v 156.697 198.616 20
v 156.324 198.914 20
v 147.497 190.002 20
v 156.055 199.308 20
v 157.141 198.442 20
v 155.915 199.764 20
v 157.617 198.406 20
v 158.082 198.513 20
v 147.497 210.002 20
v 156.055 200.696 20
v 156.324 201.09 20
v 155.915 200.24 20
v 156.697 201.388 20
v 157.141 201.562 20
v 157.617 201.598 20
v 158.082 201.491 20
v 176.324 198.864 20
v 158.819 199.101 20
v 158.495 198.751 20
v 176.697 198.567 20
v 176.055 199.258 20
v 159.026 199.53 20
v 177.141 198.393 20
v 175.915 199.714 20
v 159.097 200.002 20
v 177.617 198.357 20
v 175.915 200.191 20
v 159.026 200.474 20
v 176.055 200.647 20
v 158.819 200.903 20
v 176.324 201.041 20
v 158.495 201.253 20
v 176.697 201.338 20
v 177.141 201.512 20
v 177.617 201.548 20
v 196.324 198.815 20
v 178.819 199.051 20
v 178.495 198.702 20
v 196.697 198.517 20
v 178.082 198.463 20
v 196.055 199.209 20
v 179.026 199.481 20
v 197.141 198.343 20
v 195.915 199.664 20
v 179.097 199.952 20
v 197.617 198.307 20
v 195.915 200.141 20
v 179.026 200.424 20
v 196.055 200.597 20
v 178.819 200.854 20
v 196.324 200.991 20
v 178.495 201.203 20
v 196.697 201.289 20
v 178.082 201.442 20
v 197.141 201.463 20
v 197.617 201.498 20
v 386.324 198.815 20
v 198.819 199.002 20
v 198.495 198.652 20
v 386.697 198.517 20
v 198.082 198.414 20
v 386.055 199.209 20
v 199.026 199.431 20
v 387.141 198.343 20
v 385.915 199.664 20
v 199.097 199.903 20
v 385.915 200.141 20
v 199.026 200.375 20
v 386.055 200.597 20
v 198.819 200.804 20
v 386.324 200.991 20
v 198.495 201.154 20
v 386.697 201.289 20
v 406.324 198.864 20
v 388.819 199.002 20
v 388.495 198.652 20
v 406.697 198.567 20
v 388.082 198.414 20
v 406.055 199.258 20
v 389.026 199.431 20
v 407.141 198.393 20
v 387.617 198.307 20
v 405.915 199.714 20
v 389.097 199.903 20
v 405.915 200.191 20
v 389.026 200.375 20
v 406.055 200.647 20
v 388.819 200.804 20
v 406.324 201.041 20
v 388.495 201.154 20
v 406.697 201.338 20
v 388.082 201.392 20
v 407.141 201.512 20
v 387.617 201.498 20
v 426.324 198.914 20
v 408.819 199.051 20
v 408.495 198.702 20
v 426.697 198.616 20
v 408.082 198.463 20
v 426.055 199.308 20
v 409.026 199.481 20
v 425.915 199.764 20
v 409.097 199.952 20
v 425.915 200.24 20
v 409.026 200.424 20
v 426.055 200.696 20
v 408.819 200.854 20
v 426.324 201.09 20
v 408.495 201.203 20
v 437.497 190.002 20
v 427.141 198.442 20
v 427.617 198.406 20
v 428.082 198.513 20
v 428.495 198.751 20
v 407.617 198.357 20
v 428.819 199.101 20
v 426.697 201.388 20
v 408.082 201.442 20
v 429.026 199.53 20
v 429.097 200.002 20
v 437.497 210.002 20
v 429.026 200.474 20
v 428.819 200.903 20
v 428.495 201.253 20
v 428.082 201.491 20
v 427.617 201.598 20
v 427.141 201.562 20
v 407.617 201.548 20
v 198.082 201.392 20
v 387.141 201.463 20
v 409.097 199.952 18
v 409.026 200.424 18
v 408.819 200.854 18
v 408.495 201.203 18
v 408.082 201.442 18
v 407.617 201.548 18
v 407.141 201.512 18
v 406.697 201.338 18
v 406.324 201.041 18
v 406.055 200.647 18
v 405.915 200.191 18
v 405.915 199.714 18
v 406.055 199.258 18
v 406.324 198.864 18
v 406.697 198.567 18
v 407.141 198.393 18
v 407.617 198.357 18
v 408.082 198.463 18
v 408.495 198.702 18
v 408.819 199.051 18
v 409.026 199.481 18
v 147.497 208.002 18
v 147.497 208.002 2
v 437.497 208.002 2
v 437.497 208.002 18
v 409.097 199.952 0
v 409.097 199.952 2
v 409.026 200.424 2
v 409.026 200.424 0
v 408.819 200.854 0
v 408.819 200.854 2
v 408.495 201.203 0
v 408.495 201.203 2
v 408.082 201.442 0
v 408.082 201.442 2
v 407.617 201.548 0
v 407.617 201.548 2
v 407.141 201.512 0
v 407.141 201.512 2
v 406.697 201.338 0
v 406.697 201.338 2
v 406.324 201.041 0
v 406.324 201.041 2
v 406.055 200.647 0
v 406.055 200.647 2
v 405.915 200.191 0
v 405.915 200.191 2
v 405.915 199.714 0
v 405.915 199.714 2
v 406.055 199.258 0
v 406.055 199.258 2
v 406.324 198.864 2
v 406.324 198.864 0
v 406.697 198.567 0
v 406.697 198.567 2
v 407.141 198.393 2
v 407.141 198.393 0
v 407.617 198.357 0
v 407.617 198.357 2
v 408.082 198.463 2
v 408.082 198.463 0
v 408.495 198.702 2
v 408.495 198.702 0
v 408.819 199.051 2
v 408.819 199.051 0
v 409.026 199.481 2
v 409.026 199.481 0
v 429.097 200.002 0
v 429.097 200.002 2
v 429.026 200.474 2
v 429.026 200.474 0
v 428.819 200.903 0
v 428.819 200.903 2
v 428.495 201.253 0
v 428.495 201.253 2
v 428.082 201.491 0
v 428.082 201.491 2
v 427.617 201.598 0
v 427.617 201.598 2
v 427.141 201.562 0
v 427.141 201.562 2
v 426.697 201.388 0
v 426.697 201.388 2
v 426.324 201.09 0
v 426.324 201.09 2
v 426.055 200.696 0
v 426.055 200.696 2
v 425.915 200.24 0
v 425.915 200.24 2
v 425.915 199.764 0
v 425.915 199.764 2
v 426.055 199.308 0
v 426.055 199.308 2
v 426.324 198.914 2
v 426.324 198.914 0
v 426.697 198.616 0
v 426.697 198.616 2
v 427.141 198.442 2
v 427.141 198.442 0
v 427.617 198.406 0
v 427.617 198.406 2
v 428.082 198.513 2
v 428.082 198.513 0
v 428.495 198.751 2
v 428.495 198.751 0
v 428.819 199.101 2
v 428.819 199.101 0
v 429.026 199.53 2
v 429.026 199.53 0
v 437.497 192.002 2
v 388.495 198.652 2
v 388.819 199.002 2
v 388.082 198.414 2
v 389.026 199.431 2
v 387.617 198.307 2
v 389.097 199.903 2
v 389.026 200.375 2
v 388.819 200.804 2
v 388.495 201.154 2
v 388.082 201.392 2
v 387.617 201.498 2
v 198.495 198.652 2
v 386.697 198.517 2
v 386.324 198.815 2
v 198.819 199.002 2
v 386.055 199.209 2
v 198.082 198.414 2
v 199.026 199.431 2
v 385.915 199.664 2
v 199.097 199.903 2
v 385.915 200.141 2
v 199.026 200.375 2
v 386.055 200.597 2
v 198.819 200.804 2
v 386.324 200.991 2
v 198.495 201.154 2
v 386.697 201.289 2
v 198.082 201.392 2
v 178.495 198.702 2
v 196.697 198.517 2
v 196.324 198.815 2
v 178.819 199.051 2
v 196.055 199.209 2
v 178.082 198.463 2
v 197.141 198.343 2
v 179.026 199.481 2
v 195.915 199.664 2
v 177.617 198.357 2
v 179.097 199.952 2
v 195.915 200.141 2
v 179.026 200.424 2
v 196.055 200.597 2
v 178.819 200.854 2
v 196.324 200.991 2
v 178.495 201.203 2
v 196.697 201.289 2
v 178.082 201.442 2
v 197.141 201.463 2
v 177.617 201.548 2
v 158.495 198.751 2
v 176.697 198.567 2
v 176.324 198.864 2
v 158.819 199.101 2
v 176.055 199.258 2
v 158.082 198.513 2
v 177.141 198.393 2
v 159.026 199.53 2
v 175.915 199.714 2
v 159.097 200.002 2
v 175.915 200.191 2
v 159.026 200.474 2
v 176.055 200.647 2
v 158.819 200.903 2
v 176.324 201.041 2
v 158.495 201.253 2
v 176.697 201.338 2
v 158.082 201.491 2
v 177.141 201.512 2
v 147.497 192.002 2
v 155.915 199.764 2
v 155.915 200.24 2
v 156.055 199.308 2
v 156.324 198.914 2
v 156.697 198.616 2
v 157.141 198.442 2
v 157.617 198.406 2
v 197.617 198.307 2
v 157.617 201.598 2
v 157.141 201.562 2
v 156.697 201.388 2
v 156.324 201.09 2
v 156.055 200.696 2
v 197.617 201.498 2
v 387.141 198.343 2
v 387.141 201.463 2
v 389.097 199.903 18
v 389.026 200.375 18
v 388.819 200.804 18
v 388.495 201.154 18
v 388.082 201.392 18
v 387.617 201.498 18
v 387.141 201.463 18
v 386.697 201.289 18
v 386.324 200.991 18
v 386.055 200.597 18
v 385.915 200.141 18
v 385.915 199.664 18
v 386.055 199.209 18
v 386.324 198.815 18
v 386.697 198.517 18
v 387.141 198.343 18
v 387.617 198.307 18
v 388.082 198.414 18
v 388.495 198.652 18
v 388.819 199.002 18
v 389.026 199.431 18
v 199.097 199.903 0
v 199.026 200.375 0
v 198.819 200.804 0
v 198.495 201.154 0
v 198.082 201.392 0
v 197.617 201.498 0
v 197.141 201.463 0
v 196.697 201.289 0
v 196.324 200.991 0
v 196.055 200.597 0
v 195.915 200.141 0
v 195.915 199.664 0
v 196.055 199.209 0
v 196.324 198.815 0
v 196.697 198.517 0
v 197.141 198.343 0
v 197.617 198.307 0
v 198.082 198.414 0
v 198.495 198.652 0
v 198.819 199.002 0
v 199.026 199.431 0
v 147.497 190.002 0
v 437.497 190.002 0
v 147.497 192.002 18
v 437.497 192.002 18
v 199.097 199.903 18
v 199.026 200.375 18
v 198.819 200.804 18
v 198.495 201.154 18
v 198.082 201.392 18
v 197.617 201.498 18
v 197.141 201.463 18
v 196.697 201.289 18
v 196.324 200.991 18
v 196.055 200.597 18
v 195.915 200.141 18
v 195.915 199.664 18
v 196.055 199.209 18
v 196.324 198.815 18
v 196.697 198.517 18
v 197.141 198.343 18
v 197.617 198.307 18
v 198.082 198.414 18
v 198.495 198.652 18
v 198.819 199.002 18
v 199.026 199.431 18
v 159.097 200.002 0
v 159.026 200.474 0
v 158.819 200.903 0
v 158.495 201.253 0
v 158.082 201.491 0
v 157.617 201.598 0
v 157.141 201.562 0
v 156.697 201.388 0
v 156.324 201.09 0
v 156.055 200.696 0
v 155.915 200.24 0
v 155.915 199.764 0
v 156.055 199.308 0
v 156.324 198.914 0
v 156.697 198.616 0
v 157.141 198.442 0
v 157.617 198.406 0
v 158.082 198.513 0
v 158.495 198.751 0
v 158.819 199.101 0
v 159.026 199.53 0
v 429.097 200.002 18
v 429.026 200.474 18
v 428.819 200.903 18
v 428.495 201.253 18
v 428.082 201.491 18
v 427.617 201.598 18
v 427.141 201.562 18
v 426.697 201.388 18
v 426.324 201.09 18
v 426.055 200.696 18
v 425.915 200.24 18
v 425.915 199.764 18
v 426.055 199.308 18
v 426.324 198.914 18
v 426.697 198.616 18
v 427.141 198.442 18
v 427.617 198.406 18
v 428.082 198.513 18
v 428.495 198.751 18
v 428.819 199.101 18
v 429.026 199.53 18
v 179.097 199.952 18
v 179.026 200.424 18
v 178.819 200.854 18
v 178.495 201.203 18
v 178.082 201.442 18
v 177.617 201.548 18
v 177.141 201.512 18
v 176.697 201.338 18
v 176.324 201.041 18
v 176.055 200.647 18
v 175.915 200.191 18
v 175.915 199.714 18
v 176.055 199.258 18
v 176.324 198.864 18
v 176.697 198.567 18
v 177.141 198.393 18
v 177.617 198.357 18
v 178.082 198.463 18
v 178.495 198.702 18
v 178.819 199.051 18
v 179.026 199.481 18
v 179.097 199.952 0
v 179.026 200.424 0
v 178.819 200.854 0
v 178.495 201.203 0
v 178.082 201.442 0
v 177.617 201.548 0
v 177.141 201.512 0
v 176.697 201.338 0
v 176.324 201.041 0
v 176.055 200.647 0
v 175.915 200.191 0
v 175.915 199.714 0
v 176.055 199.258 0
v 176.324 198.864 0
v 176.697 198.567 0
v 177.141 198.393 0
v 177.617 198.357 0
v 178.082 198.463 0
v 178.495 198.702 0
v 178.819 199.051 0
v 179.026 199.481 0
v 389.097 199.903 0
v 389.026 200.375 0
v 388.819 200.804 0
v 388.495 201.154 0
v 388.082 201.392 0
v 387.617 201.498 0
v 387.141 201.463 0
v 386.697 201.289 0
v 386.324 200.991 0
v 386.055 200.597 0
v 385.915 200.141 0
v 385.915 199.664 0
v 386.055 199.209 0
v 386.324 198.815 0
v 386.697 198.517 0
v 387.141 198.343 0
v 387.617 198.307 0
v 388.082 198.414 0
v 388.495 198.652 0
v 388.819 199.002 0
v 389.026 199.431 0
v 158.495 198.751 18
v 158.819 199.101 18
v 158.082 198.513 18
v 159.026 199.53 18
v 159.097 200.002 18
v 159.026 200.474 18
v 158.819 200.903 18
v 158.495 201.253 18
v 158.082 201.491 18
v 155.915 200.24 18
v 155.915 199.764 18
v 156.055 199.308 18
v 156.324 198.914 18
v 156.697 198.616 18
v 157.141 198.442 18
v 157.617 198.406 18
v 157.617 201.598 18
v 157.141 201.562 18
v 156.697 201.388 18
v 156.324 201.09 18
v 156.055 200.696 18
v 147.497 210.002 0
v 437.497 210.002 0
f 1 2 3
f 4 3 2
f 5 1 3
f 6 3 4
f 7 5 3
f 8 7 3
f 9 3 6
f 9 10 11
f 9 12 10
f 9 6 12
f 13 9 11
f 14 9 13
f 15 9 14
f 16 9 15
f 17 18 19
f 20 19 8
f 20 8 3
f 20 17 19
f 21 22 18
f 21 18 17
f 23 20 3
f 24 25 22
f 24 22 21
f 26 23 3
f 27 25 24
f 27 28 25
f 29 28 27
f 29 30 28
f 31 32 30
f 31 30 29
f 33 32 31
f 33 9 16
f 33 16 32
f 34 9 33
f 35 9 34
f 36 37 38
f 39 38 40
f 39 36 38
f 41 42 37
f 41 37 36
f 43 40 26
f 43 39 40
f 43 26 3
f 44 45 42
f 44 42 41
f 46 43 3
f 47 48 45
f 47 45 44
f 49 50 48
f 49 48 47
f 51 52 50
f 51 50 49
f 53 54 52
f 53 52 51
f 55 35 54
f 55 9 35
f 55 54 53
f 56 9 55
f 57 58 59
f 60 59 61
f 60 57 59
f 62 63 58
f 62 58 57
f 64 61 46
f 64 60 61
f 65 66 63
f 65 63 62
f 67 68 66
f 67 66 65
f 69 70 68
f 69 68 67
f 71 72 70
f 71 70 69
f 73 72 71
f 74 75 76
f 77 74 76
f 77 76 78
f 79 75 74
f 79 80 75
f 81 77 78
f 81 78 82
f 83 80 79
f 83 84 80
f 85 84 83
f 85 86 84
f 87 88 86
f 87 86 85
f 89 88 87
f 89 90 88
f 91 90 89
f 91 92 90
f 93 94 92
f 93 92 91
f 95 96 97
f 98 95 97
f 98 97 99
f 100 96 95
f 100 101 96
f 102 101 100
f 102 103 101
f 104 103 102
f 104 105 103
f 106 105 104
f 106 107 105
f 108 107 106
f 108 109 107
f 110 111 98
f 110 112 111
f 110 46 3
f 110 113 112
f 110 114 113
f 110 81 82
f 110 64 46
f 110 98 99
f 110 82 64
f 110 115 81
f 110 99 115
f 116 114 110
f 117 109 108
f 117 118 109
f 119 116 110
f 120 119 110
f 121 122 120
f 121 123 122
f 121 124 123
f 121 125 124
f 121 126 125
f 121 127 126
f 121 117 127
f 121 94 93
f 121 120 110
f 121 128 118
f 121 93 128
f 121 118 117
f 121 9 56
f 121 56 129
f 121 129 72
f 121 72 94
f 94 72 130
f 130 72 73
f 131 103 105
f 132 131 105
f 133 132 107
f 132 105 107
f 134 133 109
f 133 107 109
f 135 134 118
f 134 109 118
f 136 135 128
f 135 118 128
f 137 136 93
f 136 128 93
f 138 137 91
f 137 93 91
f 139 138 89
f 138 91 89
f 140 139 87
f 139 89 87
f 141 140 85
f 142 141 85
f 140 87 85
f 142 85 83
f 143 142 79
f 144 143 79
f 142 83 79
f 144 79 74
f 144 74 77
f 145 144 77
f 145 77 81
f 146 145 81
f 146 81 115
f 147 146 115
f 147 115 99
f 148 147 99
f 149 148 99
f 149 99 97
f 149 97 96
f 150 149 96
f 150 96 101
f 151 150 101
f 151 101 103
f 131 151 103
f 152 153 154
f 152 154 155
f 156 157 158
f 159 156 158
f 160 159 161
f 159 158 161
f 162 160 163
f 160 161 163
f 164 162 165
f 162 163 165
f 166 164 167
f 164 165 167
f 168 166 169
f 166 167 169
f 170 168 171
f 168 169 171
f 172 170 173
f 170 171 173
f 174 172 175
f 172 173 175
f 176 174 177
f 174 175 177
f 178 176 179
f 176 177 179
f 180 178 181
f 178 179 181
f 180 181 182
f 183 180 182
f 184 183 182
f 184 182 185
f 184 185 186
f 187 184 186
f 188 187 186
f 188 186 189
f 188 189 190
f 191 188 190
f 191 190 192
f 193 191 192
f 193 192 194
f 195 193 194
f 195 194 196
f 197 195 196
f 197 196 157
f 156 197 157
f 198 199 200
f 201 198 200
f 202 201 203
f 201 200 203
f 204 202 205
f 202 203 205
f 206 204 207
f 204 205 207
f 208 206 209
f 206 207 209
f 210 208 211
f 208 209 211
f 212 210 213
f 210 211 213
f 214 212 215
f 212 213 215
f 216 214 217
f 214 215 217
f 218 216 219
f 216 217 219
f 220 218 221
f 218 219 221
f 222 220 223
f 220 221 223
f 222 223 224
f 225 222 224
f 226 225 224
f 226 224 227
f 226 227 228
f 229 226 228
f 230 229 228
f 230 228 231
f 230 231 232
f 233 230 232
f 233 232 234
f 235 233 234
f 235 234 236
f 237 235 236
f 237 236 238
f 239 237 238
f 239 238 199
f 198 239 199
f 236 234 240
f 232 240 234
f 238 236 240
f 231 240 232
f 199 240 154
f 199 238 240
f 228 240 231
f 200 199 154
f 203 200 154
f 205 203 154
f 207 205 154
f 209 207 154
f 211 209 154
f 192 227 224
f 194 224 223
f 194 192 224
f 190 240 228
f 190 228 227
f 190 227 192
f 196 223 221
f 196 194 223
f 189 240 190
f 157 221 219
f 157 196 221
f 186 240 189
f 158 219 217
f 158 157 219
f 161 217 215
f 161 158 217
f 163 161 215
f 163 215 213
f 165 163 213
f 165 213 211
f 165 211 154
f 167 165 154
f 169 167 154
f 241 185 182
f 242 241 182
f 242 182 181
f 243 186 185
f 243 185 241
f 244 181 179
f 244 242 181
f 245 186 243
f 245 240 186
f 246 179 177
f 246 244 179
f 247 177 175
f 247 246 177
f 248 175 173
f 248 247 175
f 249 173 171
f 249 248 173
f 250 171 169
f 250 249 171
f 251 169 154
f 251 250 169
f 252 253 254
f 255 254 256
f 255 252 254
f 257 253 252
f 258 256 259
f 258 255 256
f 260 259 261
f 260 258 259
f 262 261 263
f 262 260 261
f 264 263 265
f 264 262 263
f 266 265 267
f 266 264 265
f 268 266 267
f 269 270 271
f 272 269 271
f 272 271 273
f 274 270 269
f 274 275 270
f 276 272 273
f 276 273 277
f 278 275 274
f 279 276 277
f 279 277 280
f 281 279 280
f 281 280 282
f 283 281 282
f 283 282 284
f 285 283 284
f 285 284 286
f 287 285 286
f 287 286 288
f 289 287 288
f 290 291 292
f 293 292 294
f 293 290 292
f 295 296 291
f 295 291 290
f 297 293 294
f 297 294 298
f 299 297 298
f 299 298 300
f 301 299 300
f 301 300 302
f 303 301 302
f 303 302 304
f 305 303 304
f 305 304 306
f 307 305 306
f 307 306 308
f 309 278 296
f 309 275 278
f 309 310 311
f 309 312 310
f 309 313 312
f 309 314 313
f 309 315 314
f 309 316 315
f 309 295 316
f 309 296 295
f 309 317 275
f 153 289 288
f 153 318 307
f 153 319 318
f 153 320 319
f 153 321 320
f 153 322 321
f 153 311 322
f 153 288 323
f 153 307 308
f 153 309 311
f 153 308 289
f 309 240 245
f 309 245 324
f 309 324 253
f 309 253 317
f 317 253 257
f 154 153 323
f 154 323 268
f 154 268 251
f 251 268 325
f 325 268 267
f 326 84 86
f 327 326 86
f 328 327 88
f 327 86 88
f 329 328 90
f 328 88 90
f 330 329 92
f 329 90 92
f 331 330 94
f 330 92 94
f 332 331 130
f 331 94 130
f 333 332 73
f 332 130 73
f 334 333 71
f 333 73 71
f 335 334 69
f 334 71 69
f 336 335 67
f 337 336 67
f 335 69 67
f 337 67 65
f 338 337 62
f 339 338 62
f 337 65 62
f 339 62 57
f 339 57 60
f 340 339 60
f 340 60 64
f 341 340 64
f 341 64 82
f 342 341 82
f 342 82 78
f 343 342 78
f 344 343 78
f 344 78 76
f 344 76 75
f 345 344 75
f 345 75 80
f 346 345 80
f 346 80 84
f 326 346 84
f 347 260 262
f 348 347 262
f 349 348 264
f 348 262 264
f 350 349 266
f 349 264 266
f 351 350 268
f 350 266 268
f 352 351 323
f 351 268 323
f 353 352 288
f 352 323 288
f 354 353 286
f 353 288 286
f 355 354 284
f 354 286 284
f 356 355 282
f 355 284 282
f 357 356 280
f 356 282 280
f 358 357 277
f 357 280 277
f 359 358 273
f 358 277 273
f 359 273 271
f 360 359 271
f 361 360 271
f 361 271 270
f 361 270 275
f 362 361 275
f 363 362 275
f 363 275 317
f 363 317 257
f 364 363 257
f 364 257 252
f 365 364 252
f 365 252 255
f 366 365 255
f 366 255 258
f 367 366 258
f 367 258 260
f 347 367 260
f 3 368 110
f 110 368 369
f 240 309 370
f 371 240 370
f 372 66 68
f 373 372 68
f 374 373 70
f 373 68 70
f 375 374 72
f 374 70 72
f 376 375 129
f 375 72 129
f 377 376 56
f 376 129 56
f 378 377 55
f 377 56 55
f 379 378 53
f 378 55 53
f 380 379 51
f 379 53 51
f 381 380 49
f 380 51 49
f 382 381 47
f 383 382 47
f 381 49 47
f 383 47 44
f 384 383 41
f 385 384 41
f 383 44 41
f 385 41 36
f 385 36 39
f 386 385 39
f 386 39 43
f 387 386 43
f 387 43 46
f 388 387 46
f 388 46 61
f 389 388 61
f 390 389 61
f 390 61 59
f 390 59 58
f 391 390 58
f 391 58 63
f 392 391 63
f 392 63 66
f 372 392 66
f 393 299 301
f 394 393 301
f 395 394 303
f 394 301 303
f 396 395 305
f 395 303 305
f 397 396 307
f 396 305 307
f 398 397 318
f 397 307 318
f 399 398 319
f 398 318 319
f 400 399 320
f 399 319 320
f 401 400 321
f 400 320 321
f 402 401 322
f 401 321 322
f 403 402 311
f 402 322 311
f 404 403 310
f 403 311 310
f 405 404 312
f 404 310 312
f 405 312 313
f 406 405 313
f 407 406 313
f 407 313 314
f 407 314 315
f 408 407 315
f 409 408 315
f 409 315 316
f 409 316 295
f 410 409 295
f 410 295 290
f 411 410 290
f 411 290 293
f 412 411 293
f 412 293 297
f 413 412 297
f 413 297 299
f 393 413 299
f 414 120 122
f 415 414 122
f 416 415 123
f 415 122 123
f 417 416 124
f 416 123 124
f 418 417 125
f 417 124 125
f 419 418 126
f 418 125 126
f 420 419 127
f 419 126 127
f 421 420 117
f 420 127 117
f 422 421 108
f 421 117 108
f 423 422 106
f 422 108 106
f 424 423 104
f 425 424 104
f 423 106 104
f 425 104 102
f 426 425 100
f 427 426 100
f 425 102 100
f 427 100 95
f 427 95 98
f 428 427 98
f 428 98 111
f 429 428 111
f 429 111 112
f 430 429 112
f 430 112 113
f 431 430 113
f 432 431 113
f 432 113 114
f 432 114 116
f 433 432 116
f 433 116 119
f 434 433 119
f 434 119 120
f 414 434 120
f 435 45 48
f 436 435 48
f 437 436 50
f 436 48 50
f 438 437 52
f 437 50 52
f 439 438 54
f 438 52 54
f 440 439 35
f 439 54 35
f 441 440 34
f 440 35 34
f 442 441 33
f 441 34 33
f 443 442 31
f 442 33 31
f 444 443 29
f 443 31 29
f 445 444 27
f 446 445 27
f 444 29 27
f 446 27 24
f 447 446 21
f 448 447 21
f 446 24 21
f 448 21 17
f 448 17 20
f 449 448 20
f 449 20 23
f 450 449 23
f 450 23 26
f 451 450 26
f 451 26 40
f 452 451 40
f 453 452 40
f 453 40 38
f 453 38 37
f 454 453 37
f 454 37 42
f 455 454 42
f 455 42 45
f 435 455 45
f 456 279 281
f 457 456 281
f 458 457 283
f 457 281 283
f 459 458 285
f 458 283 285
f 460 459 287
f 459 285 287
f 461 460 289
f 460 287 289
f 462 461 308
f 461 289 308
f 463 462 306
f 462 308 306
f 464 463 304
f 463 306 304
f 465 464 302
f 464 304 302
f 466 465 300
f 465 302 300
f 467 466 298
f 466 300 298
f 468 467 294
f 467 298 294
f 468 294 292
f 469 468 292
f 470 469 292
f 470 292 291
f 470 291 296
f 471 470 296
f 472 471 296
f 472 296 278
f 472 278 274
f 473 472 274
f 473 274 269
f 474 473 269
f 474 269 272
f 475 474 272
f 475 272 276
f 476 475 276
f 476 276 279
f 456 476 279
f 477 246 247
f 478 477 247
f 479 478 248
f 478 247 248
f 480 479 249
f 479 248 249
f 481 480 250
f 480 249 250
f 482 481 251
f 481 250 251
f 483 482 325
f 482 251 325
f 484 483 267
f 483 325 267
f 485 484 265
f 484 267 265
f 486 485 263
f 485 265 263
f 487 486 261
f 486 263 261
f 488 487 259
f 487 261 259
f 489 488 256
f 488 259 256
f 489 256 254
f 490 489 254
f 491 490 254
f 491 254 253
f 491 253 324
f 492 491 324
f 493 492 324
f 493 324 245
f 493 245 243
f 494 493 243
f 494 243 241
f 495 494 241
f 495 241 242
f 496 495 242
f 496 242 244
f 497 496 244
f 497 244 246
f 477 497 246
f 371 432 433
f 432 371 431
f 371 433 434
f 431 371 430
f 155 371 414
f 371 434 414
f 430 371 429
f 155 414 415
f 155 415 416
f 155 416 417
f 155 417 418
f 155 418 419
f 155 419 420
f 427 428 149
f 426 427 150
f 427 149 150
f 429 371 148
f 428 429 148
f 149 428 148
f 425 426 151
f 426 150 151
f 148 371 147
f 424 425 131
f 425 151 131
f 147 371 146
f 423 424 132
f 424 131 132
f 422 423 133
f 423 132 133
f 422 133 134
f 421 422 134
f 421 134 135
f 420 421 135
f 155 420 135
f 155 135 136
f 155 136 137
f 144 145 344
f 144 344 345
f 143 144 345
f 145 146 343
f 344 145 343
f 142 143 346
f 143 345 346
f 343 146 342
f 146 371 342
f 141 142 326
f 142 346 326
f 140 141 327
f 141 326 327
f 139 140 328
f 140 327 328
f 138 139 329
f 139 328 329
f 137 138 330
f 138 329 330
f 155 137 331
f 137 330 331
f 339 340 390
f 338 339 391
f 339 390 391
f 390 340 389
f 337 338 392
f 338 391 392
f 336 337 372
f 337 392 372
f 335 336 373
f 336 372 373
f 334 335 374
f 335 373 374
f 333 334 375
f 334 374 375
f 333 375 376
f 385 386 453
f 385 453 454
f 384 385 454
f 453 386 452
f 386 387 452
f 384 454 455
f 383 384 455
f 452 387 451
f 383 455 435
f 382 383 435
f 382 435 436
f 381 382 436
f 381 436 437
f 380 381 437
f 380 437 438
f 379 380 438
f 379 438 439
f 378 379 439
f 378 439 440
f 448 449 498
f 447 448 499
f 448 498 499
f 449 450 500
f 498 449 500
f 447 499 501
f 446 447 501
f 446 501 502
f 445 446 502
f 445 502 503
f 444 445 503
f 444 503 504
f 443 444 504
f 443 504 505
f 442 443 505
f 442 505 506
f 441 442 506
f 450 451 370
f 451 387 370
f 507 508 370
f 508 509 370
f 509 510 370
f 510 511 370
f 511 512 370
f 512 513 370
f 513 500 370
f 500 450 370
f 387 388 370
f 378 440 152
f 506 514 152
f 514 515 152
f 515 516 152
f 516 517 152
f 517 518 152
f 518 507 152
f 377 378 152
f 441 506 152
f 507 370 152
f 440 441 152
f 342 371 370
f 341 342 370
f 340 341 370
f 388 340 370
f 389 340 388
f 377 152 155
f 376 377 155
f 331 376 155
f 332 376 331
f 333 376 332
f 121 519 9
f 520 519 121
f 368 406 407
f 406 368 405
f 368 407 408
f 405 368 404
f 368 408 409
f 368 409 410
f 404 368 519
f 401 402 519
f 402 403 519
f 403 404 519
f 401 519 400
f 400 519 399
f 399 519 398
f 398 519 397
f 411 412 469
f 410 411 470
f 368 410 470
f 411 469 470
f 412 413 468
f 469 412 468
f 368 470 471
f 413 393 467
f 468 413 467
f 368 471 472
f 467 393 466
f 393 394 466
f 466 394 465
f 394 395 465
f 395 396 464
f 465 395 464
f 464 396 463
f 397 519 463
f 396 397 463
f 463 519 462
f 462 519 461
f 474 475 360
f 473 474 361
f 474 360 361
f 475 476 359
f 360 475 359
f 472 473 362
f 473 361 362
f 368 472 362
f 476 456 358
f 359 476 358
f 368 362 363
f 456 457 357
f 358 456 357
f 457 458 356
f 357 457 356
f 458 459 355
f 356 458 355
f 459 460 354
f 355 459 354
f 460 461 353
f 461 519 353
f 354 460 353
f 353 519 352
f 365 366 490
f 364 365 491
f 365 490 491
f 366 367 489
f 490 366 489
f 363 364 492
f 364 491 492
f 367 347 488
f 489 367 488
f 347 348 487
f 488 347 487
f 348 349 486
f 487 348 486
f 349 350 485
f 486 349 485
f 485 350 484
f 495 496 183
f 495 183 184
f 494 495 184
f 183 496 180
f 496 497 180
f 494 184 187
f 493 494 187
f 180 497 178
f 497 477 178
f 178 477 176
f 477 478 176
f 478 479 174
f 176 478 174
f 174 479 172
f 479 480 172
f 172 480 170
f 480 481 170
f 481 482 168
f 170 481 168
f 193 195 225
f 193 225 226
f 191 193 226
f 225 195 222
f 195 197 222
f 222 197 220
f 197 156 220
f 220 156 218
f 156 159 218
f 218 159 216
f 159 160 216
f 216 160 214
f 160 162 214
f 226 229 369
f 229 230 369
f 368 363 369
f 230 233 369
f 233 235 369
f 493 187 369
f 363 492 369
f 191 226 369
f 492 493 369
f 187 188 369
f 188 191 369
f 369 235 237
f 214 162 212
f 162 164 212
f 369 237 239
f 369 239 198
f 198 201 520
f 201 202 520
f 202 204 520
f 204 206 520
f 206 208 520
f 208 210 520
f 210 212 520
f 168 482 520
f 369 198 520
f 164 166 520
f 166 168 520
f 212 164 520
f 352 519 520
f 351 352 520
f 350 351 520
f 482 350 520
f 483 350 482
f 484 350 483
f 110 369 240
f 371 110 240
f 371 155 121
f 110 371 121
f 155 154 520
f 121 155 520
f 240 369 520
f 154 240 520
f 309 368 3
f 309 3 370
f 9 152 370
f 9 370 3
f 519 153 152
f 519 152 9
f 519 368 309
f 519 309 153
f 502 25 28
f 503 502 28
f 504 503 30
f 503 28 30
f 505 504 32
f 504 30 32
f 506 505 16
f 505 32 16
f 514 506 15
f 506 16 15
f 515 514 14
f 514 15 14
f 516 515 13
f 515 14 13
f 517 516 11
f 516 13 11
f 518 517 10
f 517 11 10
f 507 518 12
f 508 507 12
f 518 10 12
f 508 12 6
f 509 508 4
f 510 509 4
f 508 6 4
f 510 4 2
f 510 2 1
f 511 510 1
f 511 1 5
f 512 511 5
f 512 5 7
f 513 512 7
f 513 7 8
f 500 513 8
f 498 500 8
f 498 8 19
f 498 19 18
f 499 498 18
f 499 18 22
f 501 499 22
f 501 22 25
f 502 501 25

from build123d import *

# Parameters (mm, degrees)
SKETCH1_W          = 290
SKETCH1_H          = 20
EXTRUDE1_DEPTH     = 20
SKETCH2_W          = 16
SKETCH2_H          = 16
CUT_EXTRUDE1_DEPTH = 300
SKETCH4_R          = 1.6
CUT_EXTRUDE2_DEPTH = 20


with BuildPart() as part:
    # Sketch1 → Extrude1 (new body)
    with BuildSketch(Plane.XY):
        with Locations((292.497048214, 200.002006631)):
            Rectangle(SKETCH1_W, SKETCH1_H)
    extrude(amount=EXTRUDE1_DEPTH)

    # Sketch2 → Cut-Extrude1 (cut)
    with BuildSketch(Plane.ZY.offset(-147.497048214)):
        with Locations((10, 200.002006631)):
            Rectangle(SKETCH2_W, SKETCH2_H)
    extrude(amount=-CUT_EXTRUDE1_DEPTH, mode=Mode.SUBTRACT)

    # Sketch4 → Cut-Extrude2 (cut)
    with BuildSketch(Plane.XY.offset(20)):
        with Locations((427.497048214, 200.002006631)):
            Circle(SKETCH4_R)
        with Locations((407.497048214, 199.95245399)):
            Circle(SKETCH4_R)
        with Locations((387.497048214, 199.90290135)):
            Circle(SKETCH4_R)
        with Locations((197.497048214, 199.90290135)):
            Circle(SKETCH4_R)
        with Locations((177.497048214, 199.95245399)):
            Circle(SKETCH4_R)
        with Locations((157.497048214, 200.002006631)):
            Circle(SKETCH4_R)
    extrude(amount=-CUT_EXTRUDE2_DEPTH, mode=Mode.SUBTRACT)


solid = part.part
